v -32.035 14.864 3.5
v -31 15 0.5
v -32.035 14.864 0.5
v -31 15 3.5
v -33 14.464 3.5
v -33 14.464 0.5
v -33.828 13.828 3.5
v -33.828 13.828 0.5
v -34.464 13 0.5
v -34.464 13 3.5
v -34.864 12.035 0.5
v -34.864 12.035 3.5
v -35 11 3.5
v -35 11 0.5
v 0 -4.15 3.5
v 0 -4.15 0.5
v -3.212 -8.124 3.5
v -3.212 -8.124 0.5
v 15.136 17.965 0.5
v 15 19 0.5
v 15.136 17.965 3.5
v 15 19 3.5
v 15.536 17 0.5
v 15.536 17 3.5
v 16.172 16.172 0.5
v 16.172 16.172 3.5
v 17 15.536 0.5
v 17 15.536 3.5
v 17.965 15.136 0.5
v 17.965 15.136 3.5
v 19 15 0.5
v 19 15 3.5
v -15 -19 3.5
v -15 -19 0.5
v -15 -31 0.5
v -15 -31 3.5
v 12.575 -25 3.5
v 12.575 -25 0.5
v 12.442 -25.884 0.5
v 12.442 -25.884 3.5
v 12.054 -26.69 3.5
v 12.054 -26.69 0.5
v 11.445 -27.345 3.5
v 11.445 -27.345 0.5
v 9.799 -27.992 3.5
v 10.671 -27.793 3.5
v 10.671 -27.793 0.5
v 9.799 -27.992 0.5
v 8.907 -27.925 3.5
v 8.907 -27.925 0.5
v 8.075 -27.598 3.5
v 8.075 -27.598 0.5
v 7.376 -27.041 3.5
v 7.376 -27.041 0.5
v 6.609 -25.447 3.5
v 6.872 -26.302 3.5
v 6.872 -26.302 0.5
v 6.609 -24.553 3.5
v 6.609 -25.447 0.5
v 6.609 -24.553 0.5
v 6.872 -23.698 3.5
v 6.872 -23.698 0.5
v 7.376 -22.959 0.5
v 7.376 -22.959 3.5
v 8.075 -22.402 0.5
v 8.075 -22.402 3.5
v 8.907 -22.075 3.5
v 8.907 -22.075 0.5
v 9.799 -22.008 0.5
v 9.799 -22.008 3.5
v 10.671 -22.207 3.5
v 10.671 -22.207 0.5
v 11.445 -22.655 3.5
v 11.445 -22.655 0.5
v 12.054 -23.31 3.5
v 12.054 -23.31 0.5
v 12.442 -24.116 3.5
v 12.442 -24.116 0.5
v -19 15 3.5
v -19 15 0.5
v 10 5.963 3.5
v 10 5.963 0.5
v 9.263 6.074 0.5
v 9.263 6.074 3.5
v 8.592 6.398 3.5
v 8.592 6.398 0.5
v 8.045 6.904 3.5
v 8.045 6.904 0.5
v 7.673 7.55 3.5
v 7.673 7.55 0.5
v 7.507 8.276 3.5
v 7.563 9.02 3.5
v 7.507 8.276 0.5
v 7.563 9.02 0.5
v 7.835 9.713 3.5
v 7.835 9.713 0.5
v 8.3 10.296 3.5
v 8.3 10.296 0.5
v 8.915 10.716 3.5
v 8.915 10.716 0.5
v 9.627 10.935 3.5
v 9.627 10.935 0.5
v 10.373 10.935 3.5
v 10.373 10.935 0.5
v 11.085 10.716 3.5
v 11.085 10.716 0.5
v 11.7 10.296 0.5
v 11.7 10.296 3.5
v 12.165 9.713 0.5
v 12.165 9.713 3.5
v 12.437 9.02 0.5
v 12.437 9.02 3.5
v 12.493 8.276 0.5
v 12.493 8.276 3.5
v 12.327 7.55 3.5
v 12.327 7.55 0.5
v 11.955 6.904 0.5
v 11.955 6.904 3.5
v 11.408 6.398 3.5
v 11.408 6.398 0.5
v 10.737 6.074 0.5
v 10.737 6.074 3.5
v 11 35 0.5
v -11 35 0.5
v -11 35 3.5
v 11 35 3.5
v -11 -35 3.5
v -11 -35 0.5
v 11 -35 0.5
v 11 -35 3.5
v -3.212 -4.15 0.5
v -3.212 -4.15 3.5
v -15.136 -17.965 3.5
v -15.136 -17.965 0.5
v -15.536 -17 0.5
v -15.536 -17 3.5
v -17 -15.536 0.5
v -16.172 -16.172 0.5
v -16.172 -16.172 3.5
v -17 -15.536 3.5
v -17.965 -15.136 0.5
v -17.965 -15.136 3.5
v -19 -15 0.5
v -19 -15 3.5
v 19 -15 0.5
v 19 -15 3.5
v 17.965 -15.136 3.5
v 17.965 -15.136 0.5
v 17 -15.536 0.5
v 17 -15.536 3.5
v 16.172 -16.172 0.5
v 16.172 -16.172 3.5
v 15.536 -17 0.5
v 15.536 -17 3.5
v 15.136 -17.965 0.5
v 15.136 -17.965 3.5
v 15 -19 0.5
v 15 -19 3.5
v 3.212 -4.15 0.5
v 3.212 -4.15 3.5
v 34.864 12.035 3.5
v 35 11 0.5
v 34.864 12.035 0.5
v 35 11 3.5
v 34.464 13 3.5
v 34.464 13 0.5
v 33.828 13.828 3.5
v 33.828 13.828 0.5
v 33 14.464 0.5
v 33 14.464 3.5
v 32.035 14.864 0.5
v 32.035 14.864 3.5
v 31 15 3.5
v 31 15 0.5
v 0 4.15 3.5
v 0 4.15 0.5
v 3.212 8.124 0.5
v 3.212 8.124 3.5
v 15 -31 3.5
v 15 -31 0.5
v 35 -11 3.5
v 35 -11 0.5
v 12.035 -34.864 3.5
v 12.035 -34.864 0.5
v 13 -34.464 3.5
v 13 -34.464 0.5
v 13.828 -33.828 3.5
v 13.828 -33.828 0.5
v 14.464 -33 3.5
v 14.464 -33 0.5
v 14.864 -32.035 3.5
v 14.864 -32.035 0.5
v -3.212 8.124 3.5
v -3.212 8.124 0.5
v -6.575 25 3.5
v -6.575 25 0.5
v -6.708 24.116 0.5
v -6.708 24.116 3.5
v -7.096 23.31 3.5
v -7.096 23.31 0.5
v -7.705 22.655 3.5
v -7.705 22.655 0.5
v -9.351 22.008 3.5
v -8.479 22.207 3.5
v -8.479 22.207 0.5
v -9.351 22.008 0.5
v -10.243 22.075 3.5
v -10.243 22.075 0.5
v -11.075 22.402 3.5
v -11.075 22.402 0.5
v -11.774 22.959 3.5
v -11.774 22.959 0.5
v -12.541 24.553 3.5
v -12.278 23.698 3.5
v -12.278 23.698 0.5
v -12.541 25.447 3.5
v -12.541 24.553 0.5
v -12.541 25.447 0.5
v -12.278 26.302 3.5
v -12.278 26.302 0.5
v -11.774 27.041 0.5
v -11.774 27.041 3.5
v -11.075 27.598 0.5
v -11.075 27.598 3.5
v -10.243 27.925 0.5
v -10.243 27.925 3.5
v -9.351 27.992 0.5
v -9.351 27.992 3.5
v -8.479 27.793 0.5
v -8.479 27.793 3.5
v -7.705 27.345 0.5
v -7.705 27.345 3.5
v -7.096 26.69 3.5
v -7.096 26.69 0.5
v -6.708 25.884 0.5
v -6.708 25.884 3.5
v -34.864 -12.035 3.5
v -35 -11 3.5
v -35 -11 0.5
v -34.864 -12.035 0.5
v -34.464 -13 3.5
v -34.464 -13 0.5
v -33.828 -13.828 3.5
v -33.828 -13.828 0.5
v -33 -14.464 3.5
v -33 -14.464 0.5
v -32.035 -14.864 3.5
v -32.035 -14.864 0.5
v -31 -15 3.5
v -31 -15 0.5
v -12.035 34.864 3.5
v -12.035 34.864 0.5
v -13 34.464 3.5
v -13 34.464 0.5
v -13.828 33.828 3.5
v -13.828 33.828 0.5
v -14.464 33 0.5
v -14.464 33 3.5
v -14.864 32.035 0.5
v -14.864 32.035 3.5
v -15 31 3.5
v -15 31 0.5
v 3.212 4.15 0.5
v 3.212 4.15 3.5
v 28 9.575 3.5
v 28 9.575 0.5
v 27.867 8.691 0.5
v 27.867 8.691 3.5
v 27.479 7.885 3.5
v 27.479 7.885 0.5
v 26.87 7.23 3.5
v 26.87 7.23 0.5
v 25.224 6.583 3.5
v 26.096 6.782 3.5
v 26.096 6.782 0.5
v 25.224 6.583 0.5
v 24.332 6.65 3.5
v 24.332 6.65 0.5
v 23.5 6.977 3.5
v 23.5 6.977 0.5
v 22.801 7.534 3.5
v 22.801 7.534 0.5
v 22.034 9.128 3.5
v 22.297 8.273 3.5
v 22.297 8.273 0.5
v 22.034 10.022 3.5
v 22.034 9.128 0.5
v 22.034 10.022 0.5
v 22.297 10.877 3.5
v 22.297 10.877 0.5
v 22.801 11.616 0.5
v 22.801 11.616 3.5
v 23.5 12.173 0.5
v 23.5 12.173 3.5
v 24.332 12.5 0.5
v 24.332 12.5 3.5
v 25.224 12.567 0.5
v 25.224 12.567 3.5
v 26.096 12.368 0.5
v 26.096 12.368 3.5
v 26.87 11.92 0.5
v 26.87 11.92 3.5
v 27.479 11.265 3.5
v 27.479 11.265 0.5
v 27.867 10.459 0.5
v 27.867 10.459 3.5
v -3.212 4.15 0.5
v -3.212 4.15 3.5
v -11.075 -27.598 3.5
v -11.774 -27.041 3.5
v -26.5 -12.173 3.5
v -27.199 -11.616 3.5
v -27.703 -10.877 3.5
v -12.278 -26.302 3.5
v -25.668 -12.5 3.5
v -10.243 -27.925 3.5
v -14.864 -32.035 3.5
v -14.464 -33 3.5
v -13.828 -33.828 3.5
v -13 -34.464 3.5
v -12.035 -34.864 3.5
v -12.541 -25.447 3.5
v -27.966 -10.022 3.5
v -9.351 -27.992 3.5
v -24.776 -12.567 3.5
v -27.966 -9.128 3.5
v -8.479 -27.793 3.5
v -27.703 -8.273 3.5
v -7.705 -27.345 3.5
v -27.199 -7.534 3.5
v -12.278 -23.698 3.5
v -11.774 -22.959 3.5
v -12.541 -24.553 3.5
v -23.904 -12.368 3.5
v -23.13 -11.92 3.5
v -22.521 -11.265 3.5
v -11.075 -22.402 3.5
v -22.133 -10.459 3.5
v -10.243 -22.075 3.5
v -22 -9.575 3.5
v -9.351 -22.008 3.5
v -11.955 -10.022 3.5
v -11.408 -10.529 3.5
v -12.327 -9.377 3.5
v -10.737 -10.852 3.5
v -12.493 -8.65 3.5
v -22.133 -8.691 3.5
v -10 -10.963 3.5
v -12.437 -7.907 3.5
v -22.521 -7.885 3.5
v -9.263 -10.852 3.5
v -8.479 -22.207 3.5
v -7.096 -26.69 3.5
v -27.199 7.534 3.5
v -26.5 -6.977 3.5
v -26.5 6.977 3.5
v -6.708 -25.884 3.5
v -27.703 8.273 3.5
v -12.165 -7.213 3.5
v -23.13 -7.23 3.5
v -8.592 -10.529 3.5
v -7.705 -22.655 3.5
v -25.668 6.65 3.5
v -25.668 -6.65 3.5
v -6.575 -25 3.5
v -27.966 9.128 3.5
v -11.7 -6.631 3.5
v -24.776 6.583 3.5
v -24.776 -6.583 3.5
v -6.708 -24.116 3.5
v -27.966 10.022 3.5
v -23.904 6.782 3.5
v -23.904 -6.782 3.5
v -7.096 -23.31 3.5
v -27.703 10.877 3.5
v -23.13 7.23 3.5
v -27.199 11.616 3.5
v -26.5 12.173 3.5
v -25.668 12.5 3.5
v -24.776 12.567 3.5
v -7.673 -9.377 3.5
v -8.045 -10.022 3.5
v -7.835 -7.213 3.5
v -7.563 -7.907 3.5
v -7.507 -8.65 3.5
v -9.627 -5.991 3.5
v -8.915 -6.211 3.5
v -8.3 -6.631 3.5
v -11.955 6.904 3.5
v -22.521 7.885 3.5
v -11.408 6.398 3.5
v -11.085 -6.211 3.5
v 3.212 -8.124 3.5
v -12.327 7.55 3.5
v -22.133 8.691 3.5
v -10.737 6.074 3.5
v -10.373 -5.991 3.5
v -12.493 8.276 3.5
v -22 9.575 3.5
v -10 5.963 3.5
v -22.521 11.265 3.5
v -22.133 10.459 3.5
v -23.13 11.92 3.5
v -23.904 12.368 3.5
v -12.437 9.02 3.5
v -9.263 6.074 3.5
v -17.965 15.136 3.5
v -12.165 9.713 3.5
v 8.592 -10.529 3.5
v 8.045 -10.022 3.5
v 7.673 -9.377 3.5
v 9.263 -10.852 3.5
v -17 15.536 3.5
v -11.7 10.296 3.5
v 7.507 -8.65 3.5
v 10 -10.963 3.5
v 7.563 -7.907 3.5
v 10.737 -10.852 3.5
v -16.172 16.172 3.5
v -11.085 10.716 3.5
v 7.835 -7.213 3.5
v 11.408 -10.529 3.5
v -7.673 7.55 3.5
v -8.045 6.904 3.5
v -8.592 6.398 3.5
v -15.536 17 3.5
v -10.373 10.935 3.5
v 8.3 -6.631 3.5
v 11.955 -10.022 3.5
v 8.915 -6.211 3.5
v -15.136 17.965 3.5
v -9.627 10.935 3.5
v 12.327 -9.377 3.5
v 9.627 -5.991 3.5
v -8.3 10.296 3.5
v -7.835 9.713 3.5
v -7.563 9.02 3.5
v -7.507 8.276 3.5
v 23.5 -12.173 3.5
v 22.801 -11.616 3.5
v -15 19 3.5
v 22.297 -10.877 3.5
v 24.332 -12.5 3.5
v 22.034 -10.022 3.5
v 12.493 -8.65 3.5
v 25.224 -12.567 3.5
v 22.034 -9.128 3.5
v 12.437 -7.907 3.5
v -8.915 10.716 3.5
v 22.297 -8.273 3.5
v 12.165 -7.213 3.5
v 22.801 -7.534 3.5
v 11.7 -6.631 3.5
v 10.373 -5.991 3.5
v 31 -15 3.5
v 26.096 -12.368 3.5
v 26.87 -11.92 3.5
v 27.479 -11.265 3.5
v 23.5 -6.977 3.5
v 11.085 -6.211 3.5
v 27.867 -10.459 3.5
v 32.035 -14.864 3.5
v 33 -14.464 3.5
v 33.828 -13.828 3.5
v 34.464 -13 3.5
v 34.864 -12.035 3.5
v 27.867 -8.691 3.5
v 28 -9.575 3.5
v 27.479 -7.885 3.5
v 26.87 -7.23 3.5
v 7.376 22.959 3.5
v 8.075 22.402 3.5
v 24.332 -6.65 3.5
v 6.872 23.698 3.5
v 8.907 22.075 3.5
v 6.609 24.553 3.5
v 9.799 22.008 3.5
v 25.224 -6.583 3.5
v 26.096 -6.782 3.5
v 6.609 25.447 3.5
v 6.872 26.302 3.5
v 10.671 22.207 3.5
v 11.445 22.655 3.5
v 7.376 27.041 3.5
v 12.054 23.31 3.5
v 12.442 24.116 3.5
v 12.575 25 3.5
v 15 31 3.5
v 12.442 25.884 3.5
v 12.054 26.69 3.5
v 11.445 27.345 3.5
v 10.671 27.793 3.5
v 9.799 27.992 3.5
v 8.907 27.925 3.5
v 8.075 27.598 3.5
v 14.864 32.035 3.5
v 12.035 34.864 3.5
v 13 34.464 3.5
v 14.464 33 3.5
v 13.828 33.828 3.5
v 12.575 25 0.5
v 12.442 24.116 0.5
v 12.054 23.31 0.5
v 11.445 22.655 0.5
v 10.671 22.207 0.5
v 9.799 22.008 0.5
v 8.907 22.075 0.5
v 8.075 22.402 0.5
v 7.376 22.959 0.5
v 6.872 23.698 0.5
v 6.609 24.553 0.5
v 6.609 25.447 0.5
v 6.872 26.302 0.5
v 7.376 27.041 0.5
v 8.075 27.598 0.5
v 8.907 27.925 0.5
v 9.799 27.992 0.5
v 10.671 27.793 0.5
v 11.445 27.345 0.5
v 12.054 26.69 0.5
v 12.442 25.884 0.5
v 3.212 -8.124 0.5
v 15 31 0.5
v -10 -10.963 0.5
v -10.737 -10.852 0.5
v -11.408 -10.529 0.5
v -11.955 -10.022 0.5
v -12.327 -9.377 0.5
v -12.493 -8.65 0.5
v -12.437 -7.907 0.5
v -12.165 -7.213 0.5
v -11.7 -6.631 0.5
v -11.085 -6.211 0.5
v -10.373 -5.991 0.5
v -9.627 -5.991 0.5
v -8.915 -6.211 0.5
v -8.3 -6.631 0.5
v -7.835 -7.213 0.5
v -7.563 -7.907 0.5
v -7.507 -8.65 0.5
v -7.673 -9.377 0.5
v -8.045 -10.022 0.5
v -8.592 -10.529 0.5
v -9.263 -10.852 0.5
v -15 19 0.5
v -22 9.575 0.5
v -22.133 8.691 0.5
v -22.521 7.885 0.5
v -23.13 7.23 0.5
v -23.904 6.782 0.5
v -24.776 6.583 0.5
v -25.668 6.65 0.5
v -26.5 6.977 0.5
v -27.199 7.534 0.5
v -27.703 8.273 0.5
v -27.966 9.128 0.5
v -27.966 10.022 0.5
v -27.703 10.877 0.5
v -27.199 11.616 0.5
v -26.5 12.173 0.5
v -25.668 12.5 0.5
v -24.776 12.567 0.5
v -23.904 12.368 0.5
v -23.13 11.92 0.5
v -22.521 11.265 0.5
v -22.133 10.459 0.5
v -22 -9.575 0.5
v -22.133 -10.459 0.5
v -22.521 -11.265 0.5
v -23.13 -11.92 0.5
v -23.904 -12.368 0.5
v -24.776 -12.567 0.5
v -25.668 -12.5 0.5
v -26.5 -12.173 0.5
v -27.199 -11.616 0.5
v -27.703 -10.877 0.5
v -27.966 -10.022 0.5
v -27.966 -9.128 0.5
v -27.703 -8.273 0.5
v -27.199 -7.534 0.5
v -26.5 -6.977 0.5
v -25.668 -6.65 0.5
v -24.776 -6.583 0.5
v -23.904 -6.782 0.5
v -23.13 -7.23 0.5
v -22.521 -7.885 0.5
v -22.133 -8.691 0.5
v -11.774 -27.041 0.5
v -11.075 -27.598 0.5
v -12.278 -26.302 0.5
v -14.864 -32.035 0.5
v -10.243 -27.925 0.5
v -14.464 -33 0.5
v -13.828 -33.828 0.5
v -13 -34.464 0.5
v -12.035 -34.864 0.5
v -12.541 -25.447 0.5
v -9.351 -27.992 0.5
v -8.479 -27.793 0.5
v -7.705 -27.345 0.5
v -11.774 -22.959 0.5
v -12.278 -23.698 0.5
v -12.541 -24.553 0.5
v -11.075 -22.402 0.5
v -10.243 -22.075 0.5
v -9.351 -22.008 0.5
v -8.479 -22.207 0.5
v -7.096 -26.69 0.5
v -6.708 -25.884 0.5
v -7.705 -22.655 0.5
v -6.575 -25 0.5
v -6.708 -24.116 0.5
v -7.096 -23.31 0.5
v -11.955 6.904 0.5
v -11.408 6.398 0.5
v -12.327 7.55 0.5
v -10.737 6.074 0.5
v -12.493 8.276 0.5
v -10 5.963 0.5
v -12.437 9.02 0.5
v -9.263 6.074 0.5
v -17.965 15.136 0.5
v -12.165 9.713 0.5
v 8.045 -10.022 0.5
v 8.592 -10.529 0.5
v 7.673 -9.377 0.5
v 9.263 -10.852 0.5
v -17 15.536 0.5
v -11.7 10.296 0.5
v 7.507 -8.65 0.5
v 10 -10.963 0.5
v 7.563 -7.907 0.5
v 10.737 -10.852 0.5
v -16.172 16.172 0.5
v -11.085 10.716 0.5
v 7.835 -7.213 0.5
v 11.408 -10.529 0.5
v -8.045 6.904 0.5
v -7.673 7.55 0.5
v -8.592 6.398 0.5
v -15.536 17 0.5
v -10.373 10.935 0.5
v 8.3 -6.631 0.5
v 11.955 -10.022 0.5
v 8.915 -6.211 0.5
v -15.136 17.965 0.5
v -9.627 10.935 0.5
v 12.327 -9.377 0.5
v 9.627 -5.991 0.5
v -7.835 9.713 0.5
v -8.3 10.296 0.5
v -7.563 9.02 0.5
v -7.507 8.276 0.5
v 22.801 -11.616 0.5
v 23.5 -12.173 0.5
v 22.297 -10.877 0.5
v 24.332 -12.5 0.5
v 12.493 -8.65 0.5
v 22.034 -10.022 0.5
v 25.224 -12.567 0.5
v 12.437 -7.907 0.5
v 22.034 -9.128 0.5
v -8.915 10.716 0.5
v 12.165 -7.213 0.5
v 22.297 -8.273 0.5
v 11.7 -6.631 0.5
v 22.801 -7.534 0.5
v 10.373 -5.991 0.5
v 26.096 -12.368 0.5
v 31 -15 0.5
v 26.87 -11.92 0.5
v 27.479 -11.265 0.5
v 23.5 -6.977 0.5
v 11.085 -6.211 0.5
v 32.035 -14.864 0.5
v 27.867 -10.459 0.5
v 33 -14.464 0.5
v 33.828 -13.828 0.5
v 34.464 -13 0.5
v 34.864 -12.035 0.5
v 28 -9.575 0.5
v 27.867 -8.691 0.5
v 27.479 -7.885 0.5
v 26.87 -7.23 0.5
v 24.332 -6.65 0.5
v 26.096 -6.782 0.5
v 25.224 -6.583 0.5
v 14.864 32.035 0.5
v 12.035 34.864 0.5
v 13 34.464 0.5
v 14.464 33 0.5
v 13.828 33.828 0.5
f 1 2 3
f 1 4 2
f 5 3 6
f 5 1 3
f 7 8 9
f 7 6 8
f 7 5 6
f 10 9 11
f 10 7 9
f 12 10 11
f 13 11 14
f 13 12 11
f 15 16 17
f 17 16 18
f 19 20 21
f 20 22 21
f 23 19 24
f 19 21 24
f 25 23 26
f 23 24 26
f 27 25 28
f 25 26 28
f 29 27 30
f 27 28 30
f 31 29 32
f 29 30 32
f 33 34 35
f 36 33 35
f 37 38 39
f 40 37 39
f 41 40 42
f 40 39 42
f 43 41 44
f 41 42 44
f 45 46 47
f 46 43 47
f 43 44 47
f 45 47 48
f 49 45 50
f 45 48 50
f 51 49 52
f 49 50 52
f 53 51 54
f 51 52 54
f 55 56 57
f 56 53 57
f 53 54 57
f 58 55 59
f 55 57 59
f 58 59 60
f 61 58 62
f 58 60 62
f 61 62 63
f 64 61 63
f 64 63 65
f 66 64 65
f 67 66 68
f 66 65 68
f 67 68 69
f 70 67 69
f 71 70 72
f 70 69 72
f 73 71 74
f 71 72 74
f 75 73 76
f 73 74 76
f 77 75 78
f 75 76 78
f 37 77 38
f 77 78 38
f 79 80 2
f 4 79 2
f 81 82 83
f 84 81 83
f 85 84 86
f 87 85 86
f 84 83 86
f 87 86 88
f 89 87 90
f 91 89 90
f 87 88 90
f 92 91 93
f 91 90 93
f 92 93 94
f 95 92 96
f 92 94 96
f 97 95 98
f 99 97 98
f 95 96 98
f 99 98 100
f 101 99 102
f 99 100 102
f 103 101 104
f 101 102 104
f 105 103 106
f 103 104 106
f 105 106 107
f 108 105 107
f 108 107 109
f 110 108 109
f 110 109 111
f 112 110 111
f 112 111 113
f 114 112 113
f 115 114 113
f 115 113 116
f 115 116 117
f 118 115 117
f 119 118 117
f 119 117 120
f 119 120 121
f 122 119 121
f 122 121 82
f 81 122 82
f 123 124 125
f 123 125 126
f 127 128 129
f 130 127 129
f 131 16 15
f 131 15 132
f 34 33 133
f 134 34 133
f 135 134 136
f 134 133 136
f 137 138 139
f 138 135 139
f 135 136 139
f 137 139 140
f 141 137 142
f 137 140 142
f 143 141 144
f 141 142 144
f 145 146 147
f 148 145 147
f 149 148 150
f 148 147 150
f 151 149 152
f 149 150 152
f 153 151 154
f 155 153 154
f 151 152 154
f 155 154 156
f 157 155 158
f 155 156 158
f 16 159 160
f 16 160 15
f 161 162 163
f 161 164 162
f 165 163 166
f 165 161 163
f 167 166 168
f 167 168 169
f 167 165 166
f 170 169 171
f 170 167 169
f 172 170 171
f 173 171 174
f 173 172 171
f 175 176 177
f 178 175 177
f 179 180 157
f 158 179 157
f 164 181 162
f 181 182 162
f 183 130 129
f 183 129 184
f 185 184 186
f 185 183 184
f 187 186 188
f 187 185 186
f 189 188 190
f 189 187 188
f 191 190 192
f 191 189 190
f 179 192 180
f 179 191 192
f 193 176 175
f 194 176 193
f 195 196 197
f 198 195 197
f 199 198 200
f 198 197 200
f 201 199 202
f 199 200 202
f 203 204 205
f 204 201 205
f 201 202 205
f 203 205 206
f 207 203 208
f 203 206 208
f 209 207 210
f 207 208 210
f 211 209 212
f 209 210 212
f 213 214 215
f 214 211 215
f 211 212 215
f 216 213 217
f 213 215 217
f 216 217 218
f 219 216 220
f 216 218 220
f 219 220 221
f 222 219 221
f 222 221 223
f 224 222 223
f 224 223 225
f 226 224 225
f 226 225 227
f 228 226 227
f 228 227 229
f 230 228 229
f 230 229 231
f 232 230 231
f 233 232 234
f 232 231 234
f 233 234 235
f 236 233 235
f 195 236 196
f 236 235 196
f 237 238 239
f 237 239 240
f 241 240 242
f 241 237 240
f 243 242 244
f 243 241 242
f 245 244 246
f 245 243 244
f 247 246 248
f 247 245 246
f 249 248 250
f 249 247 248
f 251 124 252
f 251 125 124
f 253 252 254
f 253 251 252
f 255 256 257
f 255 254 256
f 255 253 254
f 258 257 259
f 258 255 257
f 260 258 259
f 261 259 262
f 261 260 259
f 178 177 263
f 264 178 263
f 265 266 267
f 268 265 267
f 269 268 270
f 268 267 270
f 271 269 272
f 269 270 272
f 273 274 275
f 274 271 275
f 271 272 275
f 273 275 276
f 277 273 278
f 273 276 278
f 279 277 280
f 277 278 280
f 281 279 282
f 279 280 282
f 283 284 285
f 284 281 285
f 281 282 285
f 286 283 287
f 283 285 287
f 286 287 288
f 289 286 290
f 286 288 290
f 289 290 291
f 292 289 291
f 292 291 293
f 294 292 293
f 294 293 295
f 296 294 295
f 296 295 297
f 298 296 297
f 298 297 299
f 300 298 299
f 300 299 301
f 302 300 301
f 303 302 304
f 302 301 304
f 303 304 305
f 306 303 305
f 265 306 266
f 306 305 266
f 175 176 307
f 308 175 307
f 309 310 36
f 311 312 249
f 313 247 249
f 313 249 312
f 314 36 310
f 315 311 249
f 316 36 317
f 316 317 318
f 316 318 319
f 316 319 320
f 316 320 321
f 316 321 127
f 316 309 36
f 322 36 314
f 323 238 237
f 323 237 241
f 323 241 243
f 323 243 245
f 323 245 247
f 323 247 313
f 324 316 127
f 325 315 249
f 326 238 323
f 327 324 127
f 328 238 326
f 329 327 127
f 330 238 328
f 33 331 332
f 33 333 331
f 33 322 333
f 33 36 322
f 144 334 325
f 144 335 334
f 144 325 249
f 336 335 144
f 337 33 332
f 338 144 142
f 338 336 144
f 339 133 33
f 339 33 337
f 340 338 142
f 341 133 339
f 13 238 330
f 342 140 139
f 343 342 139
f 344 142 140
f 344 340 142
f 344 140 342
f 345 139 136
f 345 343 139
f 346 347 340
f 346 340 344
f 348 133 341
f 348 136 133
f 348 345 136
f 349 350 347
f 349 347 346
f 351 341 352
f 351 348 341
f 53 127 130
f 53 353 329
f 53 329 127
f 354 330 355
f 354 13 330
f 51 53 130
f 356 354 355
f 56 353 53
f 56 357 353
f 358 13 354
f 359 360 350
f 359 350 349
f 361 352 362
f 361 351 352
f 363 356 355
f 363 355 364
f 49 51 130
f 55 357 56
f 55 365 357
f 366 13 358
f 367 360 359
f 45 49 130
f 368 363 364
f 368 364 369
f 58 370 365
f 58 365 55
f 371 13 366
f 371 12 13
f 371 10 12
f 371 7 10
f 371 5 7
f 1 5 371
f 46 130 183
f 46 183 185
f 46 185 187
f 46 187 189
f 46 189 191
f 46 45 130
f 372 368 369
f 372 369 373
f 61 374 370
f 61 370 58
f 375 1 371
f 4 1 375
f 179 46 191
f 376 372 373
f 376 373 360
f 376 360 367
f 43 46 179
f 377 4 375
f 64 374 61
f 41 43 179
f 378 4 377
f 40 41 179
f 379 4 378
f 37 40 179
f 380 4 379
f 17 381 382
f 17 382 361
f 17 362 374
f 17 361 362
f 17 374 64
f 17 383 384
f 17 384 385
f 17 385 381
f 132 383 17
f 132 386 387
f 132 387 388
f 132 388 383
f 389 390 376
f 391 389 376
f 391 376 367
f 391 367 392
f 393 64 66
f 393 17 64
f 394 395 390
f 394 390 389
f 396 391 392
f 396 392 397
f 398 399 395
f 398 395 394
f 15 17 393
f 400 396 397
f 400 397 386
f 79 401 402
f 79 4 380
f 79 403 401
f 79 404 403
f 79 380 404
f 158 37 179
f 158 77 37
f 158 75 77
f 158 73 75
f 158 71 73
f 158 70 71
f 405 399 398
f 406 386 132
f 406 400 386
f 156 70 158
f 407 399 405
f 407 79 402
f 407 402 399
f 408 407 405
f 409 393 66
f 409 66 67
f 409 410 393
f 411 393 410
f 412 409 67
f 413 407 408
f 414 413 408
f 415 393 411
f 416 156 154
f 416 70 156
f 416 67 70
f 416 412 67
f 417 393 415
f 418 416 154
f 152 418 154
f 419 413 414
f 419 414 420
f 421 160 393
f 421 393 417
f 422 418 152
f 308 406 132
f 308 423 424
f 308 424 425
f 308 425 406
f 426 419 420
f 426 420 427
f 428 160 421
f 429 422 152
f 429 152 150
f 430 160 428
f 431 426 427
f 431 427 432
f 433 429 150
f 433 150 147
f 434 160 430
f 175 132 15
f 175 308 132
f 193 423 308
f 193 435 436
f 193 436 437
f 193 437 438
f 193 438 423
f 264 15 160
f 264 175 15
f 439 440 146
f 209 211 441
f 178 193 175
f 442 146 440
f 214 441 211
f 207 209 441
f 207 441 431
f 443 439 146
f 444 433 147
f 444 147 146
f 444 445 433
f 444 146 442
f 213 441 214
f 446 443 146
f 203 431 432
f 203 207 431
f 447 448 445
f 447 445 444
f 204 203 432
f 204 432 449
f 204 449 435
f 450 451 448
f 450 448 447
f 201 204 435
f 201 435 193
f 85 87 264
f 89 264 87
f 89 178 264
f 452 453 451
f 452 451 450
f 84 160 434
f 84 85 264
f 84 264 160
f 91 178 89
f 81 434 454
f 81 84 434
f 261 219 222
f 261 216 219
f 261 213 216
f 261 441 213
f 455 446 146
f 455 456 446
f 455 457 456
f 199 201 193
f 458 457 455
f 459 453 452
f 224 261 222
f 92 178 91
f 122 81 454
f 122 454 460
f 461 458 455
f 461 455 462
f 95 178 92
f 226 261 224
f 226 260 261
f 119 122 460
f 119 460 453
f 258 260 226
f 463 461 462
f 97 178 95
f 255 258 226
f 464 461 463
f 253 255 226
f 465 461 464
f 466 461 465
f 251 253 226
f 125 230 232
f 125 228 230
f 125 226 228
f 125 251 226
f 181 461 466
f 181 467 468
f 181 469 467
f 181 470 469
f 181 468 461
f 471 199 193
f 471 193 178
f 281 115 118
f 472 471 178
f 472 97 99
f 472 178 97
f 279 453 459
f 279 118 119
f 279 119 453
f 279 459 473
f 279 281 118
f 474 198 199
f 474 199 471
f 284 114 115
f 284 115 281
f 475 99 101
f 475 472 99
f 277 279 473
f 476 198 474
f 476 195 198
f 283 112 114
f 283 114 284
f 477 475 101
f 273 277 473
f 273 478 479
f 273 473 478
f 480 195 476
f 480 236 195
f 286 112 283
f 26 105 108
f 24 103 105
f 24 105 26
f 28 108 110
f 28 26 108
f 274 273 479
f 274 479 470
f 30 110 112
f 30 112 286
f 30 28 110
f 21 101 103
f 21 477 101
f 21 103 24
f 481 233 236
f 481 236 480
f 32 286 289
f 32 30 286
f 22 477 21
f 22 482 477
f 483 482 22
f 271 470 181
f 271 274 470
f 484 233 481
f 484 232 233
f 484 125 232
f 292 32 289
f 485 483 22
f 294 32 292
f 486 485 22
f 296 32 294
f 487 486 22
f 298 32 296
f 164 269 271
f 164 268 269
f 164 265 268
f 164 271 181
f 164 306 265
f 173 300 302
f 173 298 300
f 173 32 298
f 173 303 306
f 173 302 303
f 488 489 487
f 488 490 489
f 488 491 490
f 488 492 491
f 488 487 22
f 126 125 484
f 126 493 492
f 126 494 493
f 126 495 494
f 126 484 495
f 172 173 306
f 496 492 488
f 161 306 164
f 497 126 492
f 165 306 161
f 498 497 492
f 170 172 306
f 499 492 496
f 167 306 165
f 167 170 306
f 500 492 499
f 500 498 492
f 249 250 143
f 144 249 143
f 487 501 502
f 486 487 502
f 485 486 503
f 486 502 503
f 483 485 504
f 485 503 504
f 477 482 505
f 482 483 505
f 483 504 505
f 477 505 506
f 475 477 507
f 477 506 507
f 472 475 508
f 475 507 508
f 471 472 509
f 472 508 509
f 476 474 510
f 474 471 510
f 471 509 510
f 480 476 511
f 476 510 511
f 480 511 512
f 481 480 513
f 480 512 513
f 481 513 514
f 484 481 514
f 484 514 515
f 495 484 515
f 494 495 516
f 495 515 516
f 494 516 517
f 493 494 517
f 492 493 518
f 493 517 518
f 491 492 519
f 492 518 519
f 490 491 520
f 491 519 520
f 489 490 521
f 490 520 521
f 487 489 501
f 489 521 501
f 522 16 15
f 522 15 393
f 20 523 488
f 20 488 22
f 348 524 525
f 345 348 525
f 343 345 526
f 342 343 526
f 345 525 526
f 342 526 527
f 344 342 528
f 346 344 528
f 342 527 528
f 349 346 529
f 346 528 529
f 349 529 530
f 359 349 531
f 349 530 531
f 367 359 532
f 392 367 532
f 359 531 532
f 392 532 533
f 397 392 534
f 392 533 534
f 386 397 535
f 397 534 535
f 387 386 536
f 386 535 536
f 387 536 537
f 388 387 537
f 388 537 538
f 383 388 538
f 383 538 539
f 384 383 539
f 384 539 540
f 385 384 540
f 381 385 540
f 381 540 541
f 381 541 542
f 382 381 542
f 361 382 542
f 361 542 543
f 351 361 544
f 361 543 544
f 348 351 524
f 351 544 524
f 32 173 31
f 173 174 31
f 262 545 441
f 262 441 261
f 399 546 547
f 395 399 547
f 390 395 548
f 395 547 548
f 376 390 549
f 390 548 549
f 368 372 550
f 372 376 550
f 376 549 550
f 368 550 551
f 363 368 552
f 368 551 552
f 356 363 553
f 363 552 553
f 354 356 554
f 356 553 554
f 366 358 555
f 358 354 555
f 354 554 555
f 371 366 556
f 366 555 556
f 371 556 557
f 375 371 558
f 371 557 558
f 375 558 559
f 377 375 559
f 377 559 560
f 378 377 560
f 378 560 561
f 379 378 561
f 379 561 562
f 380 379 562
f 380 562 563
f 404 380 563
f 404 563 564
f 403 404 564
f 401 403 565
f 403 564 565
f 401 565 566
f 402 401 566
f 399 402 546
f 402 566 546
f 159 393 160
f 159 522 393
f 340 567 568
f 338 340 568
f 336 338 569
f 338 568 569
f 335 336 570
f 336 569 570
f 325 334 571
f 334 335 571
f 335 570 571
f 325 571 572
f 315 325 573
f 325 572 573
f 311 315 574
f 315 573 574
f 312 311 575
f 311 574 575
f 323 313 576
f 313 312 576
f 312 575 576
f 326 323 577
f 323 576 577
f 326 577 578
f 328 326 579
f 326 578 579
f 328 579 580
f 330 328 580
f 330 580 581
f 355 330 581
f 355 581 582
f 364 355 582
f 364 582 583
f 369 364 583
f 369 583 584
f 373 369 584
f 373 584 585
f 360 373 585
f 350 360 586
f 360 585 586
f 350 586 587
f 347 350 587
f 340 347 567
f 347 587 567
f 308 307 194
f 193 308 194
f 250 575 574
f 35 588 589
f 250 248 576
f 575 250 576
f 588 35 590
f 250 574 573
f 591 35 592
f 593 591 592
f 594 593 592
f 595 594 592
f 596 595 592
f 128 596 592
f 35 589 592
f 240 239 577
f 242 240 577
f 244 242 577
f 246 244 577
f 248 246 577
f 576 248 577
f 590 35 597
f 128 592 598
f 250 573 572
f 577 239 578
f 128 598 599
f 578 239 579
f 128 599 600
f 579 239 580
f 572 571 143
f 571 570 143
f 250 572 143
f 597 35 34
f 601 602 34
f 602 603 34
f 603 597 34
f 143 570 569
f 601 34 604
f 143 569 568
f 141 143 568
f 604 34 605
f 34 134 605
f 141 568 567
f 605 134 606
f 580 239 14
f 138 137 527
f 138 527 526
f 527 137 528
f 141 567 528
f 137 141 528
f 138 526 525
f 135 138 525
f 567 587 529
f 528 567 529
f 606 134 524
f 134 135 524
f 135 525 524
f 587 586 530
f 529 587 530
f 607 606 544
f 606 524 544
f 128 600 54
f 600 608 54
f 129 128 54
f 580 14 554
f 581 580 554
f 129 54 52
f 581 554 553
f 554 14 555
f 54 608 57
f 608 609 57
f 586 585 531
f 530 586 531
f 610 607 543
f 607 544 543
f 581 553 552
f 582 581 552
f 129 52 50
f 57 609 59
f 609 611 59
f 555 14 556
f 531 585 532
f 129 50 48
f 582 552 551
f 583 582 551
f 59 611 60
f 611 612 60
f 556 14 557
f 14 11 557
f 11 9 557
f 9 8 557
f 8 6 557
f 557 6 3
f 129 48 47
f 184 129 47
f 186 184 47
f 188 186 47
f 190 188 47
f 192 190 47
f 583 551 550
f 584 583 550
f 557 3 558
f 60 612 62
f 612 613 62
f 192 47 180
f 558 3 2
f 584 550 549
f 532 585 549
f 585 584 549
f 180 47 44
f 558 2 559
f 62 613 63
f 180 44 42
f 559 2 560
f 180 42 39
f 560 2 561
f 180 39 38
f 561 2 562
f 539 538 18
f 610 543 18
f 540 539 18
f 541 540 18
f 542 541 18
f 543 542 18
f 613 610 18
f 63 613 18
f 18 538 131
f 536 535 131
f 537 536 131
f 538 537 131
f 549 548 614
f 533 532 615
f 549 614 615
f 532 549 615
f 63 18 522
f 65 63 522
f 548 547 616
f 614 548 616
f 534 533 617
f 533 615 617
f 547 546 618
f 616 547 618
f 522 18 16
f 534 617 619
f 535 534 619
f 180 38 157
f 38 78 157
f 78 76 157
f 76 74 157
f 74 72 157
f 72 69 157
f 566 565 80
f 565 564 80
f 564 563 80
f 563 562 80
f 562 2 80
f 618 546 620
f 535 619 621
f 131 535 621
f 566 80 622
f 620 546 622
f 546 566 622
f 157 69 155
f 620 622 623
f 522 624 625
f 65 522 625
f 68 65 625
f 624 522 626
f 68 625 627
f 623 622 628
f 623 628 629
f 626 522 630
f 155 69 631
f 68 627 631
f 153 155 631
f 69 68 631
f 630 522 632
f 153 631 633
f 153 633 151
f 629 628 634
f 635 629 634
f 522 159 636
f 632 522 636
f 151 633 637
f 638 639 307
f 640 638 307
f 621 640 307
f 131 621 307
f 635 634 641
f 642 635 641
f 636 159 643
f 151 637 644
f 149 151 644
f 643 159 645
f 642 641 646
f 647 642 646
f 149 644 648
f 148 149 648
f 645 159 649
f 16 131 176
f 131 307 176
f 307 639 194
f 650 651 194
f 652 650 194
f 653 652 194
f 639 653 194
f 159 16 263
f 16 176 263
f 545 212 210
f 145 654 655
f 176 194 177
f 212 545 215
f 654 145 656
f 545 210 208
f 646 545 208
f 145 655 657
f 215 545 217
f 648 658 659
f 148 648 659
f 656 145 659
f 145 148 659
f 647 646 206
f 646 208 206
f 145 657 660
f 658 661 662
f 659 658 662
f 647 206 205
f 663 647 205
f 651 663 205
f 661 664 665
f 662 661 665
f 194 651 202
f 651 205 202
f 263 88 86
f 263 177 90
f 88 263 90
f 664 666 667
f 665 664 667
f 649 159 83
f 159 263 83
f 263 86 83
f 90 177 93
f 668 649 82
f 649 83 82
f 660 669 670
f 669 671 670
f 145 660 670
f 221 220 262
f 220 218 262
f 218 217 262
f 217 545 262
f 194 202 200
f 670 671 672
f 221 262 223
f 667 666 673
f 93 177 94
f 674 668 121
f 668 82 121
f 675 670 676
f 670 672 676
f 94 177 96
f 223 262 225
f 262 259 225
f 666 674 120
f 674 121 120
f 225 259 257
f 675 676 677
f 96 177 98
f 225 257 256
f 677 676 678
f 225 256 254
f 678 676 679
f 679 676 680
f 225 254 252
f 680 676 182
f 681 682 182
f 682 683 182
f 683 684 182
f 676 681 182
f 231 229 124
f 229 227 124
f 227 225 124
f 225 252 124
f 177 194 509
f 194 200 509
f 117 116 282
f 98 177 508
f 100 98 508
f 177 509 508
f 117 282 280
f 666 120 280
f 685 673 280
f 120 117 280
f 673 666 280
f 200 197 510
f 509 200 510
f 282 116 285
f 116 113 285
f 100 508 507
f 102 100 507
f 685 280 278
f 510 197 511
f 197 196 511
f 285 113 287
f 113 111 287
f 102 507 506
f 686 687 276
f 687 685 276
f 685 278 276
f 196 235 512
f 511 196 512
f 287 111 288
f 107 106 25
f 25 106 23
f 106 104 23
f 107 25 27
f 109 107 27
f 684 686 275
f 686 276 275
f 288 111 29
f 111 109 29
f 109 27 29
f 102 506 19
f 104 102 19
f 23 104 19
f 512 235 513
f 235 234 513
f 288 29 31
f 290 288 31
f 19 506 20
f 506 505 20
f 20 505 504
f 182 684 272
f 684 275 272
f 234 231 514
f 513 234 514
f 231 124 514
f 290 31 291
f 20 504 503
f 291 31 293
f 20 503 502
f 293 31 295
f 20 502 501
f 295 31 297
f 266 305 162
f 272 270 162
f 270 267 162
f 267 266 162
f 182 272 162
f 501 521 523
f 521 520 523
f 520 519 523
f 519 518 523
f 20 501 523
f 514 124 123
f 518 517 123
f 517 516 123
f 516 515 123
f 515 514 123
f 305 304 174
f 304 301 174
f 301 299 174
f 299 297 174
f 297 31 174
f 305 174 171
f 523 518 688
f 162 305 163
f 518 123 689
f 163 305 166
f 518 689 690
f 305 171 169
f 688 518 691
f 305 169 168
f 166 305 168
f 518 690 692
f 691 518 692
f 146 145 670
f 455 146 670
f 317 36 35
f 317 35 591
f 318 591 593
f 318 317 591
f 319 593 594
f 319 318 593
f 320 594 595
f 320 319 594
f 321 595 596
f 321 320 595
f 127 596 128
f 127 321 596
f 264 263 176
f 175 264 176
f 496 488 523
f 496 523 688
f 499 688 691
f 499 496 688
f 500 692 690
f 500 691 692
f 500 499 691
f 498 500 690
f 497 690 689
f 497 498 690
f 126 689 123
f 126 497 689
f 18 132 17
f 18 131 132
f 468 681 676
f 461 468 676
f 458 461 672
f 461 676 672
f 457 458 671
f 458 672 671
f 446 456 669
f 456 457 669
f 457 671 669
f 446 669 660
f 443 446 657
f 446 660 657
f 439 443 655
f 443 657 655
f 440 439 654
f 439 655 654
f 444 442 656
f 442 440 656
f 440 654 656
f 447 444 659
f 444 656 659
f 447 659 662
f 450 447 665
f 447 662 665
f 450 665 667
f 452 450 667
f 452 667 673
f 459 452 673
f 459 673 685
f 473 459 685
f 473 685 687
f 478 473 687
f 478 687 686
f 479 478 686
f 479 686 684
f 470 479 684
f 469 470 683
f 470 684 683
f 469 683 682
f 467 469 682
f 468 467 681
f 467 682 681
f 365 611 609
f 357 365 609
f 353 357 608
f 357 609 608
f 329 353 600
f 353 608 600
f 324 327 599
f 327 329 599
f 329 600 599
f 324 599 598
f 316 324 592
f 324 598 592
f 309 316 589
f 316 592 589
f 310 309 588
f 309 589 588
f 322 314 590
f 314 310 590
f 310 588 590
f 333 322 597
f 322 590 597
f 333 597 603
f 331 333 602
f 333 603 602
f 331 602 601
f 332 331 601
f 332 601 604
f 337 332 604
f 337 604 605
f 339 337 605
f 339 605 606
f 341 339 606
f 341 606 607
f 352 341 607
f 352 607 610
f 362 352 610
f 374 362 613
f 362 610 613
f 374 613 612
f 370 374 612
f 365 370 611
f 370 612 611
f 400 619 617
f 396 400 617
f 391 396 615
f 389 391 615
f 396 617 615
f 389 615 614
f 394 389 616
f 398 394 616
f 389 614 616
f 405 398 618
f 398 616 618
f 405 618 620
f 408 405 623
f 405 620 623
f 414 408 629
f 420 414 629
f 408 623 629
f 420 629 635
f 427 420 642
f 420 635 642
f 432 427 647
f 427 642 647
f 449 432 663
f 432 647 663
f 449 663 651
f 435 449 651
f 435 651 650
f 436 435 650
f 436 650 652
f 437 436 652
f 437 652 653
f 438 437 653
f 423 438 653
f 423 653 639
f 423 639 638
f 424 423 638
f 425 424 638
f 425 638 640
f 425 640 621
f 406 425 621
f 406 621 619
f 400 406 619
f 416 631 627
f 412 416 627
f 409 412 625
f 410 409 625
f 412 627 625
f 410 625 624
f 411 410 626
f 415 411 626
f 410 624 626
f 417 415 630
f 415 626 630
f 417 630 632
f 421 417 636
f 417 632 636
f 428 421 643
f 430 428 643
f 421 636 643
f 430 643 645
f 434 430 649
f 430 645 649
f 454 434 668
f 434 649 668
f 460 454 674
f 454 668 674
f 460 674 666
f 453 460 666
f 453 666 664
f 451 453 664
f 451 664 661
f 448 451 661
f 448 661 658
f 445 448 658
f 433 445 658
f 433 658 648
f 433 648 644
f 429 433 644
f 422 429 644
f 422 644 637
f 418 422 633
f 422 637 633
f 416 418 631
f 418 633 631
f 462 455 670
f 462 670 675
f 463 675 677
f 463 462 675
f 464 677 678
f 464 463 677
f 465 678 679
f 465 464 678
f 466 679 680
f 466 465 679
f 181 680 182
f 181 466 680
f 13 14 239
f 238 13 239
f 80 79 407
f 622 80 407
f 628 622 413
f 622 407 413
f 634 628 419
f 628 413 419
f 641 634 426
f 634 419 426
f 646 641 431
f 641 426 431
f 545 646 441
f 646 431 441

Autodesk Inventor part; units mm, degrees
sketch "Sketch1" plane through (0, 0, 0) normal (0, 0, 1) x (1, 0, 0)
  line L0 (-336.1151, 0) -> (336.1151, 0) construction
  line L1 (15, 0) -> (50, 0) construction
  arc A0 (118.85, 219.94) -> (113.6034, 240) centre (-43.6266, 188.1614) ccw
  spline S0 degree 3 poles (118.85, 219.94) (128.5526, 163.9297) (111.383, 35.0272) (50, 0) knots 0 0 0 0 1 1 1 1
  line L2 (15, -15) -> (-15, -15)
  line L3 (-15, -15) -> (-15, 15)
  line L4 (-15, 15) -> (15, 15)
  line L5 (15, 15) -> (15, -15)
  line L6 (15, -15) -> (-15, 15) construction
  line L7 (-15, -15) -> (15, 15) construction
  line L8 (-32.5, -4.15) -> (32.5, -4.15) construction
  line L9 (32.5, -4.15) -> (32.5, 4.15) construction
  line L10 (32.5, 4.15) -> (-32.5, 4.15) construction
  line L11 (-32.5, 4.15) -> (-32.5, -4.15) construction
  line L12 (-32.5, -4.15) -> (32.5, 4.15) construction
  line L13 (32.5, -4.15) -> (-32.5, 4.15) construction
  arc A1 (15, 0) -> (50, 0) centre (32.5, 54.6766) ccw
  arc A2 (0, 15) -> (0, 50) centre (-54.6766, 32.5) ccw
  spline S1 degree 3 poles (-219.94, 118.85) (-163.9297, 128.5526) (-35.0272, 111.383) (0, 50) knots 0 0 0 0 1 1 1 1
  arc A3 (-219.94, 118.85) -> (-240, 113.6034) centre (-188.1614, -43.6266) ccw
  arc A4 (-15, 0) -> (-50, 0) centre (-32.5, -54.6766) ccw
  spline S2 degree 3 poles (-118.85, -219.94) (-128.5526, -163.9297) (-111.383, -35.0272) (-50, 0) knots 0 0 0 0 1 1 1 1
  arc A5 (-118.85, -219.94) -> (-113.6034, -240) centre (43.6266, -188.1614) ccw
  arc A6 (0, -15) -> (0, -50) centre (54.6766, -32.5) ccw
  spline S3 degree 3 poles (219.94, -118.85) (163.9297, -128.5526) (35.0272, -111.383) (0, -50) knots 0 0 0 0 1 1 1 1
  arc A7 (219.94, -118.85) -> (240, -113.6034) centre (188.1614, 43.6266) ccw
  point P0 (0, 0)
  point P1 (96.03, 57.2611)
  point P2 (119.66, 152.26)
  point P3 (119.6553, 152.2584)
  point P4 (0, 0)
  point P5 (-152.2584, 119.6553)
  point P6 (-57.2611, 96.03)
  point P7 (-15, 0)
  point P8 (-119.6553, -152.2584)
  point P9 (-96.03, -57.2611)
  point P10 (0, -15)
  point P11 (240, -113.6034)
  point P12 (152.2584, -119.6553)
  point P13 (57.2611, -96.03)
  point P14 (-15, 0)
  point P15 (-152.2584, 119.6553)
  point P16 (-57.2611, 96.03)
  point P17 (-119.6553, -152.2584)
  point P18 (-96.03, -57.2611)
  point P19 (152.2584, -119.6553)
  point P20 (57.2611, -96.03)
  dimension "d0" = 50
  dimension "d1" = 57.2611
  dimension "d2" = 96.03
  dimension "d3" = 119.66
  dimension "d6" = 118.85
  dimension "d12" = 240
  dimension "d38" = 65
  dimension "d39" = 8.3
  dimension "d61" = 360
sketch "Sketch2" plane through (0, 0, 0) normal (1, 0, 0) x (0, 1, 0)
  point P0 (0, 0)
  point P1 (0, 0)
  point P2 (240, 0)
ref_plane "Work Plane1" through (15, 0, 0) normal (1, 0, 0) x (0, 1, 0)
sketch "Sketch3" plane through (15, 0, 0) normal (1, 0, 0) x (0, 1, 0)
  line L0 (-10, -0.5) -> (10, -0.5)
  line L1 (10, -0.5) -> (10, 0.5)
  line L2 (10, 0.5) -> (-10, 0.5)
  line L3 (-10, 0.5) -> (-10, -0.5)
  line L4 (-10, -0.5) -> (10, 0.5) construction
  line L5 (10, -0.5) -> (-10, 0.5) construction
  point P0 (0, 0)
  dimension "d8" = 20
  dimension "d9" = 1
ref_plane "Work Plane2" through (52.6524, -10, -0.5) normal (0, 0, -1) x (-1, 0, 0)
sketch "Sketch4" plane through (52.6524, -10, -0.5) normal (0, 0, -1) x (-1, 0, 0)
  point P0 (52.6524, 10)
  point P1 (2.6524, 10)
  point P2 (-43.3776, 67.2611)
  point P3 (-67.0076, 162.26)
  point P4 (-66.1976, 229.94)
ref_plane "Work Plane3" through (15, -10, 0.5) normal (0, 0, 1) x (1, 0, 0)
sketch "Sketch5" plane through (15, -10, 0.5) normal (0, 0, 1) x (1, 0, 0)
  line L0 (17.5, 14.15) -> (-47.5, 14.15) construction
  line L1 (-47.5, 5.85) -> (17.5, 5.85) construction
  line L2 (-47.5, 14.15) -> (-47.5, 5.85) construction
  line L3 (17.5, 5.85) -> (17.5, 14.15) construction
  line L4 (0, -5) -> (20, -5)
  line L5 (20, -5) -> (20, 25)
  line L6 (20, 25) -> (0, 25)
  line L7 (0, 25) -> (0, -5)
  line L8 (0, 14.15) -> (20, 25) construction
  line L9 (20, 14.15) -> (0, 25) construction
  line L10 (0, -5) -> (20, 5.85) construction
  line L11 (20, -5) -> (0, 5.85) construction
  line L12 (10, 19.575) -> (10, 0.425) construction
  point P0 (-15, 10)
  point P1 (0, 25)
  point P2 (-30, 25)
  point P3 (-30, -5)
  dimension "d40" = 20
  dimension "d41" = 30
ref_plane "Work Plane5" through (15, 15, 0.5) normal (0, 0, 1) x (1, 0, 0)
sketch "Sketch6" plane through (15, 15, 0.5) normal (0, 0, 1) x (1, 0, 0)
  circle A0 centre (81.03, 42.2611) radius 6.8 projected
  circle A1 centre (103.85, 204.94) radius 6.8 projected
  circle A2 centre (104.66, 137.26) radius 6.8 projected
  circle A3 centre (35, -15) radius 6.8 projected
  arc A4 (113.2428, 206.6719) -> (106.6941, 230.8772) centre (-58.6266, 173.1614) ccw projected
  line L0 (90.5128, 219.1228) -> (106.6941, 230.8772) projected
  arc A5 (94.5125, 203.2183) -> (90.5128, 219.1228) centre (-58.6266, 173.1614) ccw projected
  arc A6 (20, -8.1753) -> (29.677, -6.6675) centre (17.5, 39.6766) ccw projected
  line L1 (20, -8.1753) -> (20, 0) projected
  line L2 (20, 0) -> (0, 0) projected
  line L3 (0, 0) -> (0, -15) projected
  line L4 (-1.9583, -24.4011) -> (0, -15) projected
  arc A7 (-1.9583, -24.4011) -> (0, -24.9633) centre (17.5, 39.6766) ccw projected
  line L5 (0, -24.9633) -> (0, -30) projected
  line L6 (0, -30) -> (20, -30) projected
  line L7 (20, -30) -> (20, -27.2437) projected
  arc A8 (20, -27.2437) -> (37.8217, -24.1325) centre (17.5, 39.6766) ccw projected
  circle A9 centre (10, -24.575) radius 3 projected
  circle A10 centre (10, -5.425) radius 3 projected
  line L8 (0, -15) -> (0, 0) projected
  line L9 (0, 0) -> (-1.9583, 0)
  line L10 (-1.9583, 0) -> (-1.9583, -30)
  line L11 (-1.9583, -30) -> (0, -30)
  line L12 (0, -30) -> (0, 0)
  point P0 (-15, -15)
ref_plane "Work Plane4" through (15, 15, 0.5) normal (0, 0, 1) x (1, 0, 0)
sketch "Sketch7" plane through (15, 15, 0.5) normal (0, 0, 1) x (1, 0, 0)
  line L0 (-50, -30) -> (20, -30)
  line L1 (20, -30) -> (20, 0)
  line L2 (20, 0) -> (-50, 0)
  line L3 (-50, 0) -> (-50, -30)
  line L4 (-16, -30) -> (-14, -30)
  line L5 (-14, 0) -> (-16, 0)
  line L6 (20, -20) -> (20, -10)
  line L7 (-50, -10) -> (-50, -20)
  line L8 (20, 0) -> (20, -30)
  line L9 (20, -30) -> (0, -30)
  line L10 (-50, 0) -> (-30, 0)
  line L11 (-30, -30) -> (-50, -30)
  line L12 (-50, -30) -> (-50, 0)
  line L13 (20, -10) -> (20, 0)
  line L14 (20, 0) -> (0, 0)
  line L15 (0, -30) -> (20, -30) projected
  line L16 (20, -20) -> (20, -30)
  line L17 (20, -30) -> (0, -30)
  line L18 (-30, -30) -> (-16, -30)
  circle A0 centre (10, -5.425) radius 3 projected
  circle A1 centre (10, -24.575) radius 3 projected
  line L19 (-50, -15) -> (20, -15) construction
  circle A2 centre (-40, -5.425) radius 3
  circle A3 centre (-40, -24.575) radius 3
  line L20 (-48.7, -19.15) -> (18.7, -19.15) construction
  line L21 (-48.7, -10.85) -> (-48.7, -15) construction
  line L22 (-48.7, -19.15) -> (18.7, -10.85) construction
  line L23 (18.7, -19.15) -> (-48.7, -10.85) construction
  line L24 (-15, -10.85) -> (-18.212, -6.8756)
  line L25 (-15, -10.85) -> (-11.788, -6.8756)
  line L26 (-50, -19.15) -> (-50, -10.85)
  line L27 (20, -19.15) -> (18.7, -19.15)
  line L28 (20, -10.85) -> (20, -19.15)
  line L29 (18.7, -10.85) -> (-11.788, -10.85) construction
  line L30 (-18.212, -10.85) -> (-48.7, -10.85) construction
  line L31 (-18.212, -6.8756) -> (-11.788, -6.8756)
  line L32 (-48.7, -15) -> (-49.61, -12.5368)
  line L33 (-48.7, -15) -> (-49.61, -17.4632)
  line L34 (-49.61, -17.4632) -> (-49.61, -12.5368)
  line L35 (-18.212, -6.8756) -> (-11.788, -6.8756)
  line L36 (-11.788, -6.8756) -> (-11.788, -10.85)
  line L37 (-11.788, -10.85) -> (-18.212, -10.85)
  line L38 (-18.212, -10.85) -> (-18.212, -6.8756)
  line L39 (-15, -19.15) -> (-18.212, -23.1244)
  line L40 (-15, -19.15) -> (-11.788, -23.1244)
  line L41 (-18.212, -23.1244) -> (-11.788, -23.1244)
  line L42 (-18.212, -23.1244) -> (-11.788, -23.1244)
  line L43 (-11.788, -23.1244) -> (-11.788, -19.15)
  line L44 (-11.788, -19.15) -> (-18.212, -19.15)
  line L45 (-18.212, -19.15) -> (-18.212, -23.1244)
  line L46 (-15, 0) -> (-15, -30) construction
  line L47 (-49.61, -12.5368) -> (-48.7, -12.5368)
  line L48 (-48.7, -12.5368) -> (-48.7, -17.4632)
  line L49 (-48.7, -17.4632) -> (-49.61, -17.4632)
  line L50 (-49.61, -17.4632) -> (-49.61, -12.5368)
  line L51 (18.7, -15) -> (19.61, -12.5368)
  line L52 (18.7, -15) -> (19.61, -17.4632)
  line L53 (19.61, -17.4632) -> (19.61, -12.5368)
  line L54 (19.61, -12.5368) -> (18.7, -12.5368)
  line L55 (18.7, -12.5368) -> (18.7, -17.4632)
  line L56 (18.7, -17.4632) -> (19.61, -17.4632)
  line L57 (19.61, -17.4632) -> (19.61, -12.5368)
  circle A4 centre (-24.575, -40) radius 3
  circle A5 centre (-5.425, -40) radius 3
  circle A6 centre (10, -24.575) radius 3
  circle A7 centre (10, -5.425) radius 3
  circle A8 centre (-5.425, 10) radius 3
  circle A9 centre (-24.575, 10) radius 3
  line L58 (-30, 20) -> (0, 20)
  line L59 (0, 20) -> (0, 0)
  line L60 (0, 0) -> (-30, 0)
  line L61 (-30, 0) -> (-30, 20)
  line L62 (-30, 20) -> (0, 0) construction
  line L63 (0, 20) -> (-30, 0) construction
  line L64 (-30, -50) -> (0, -50)
  line L65 (0, -50) -> (0, -30)
  line L66 (-30, -30) -> (-30, -50)
  line L67 (-30, -50) -> (0, -50)
  line L68 (0, -50) -> (0, -30)
  line L69 (0, -30) -> (-30, -30)
  line L70 (-30, -30) -> (-30, -50)
  point P0 (-15, -15)
  point P1 (-15, 10)
  dimension "d63" = 2
  dimension "d72" = 6
  dimension "d73" = 6
  dimension "d77" = 67.4
  dimension "d78" = 8.3
  dimension "d84" = 70
  dimension "d91" = 360
  dimension "d93" = 30
extrude "Extrusion7" add sketch "Sketch7" along normal blind 3 contours L3 L2 L1 L0 | L24 L31 L25 | L33 L34 L32 | L40 L41 L39 | L51 L53 L52
extrude "Extrusion8" add sketch "Sketch7" along normal blind 3 contours L61 L58 L59 L2
extrude "Extrusion9" add sketch "Sketch7" along normal blind 3 contours L0 L65 L64 L66
fillet "Fillet7" radius 4 12 edges at (15, 15, 2) (15, 35, 2) (35, 15, 2) (35, -15, 2) (15, -35, 2) (-15, -35, 2) (-15, -15, 2) (-35, -15, 2) (-35, 15, 2) (-15, 35, 2) (-15, 15, 2) (15, -15, 2)
sketch "Sketch8" plane through (15, 15, 3.5) normal (0, 0, 1) x (1, 0, 0)
  line L0 (-49.61, -12.5368) -> (-48.7, -12.5368) construction
  line L1 (19.61, -17.4632) -> (18.7, -17.4632) construction
  line L2 (-48.7, -12.5368) -> (18.7, -17.4632) construction
  line L3 (-48.7, -17.4632) -> (18.7, -12.5368) construction
  line L4 (-48.7, -12.5368) -> (18.7, -12.5368) construction
  line L5 (18.7, -12.5368) -> (18.7, -17.4632) construction
  line L6 (18.7, -17.4632) -> (-48.7, -17.4632) construction
  line L7 (-48.7, -17.4632) -> (-48.7, -12.5368) construction
  line L8 (-48.7, -12.5368) -> (-15, -12.5368) construction
  line L9 (-15, -12.5368) -> (-15, -17.4632) construction
  line L10 (-15, -17.4632) -> (-48.7, -17.4632) construction
  line L11 (-48.7, -17.4632) -> (-48.7, -12.5368) construction
  line L12 (-31.85, -17.4632) -> (-31.85, 4.3897) construction
  line L13 (-48.7, -15) -> (-15, -15) construction
  line L14 (-31.85, -6.5368) -> (-1.9543, -6.5368) construction
  line L15 (-48.7, -17.4632) -> (18.7, -17.4632)
  line L16 (18.7, -17.4632) -> (18.7, -12.5368)
  line L17 (18.7, -12.5368) -> (-48.7, -12.5368)
  line L18 (-48.7, -12.5368) -> (-48.7, -17.4632)
  point P0 (-25, -6.5368)
  point P1 (-25, -23.4632)
  point P2 (-5, -6.5368)
  point P3 (-5, -23.4632)
  dimension "d99" = 6
  dimension "d107" = 10
hole "Hole4" at (-10, 8.4632, 3.5) at (-10, -8.4632, 3.5) at (10, -8.4632, 3.5) at (10, 8.4632, 3.5) direction (0, 0, -1) diameter 5 end through all
sketch "Sketch9" plane through (15, 15, 3.5) normal (0, 0, 1) x (1, 0, 0)
  line L0 (-49.61, -12.5368) -> (-48.7, -12.5368) projected
  line L1 (-48.7, -15) -> (-49.61, -12.5368) projected
  line L2 (-49.61, -17.4632) -> (-48.7, -15) projected
  line L3 (-48.7, -15) -> (-48.7, -17.4632) projected
  line L4 (-48.7, -17.4632) -> (-49.61, -17.4632) projected
  line L5 (-48.7, -12.5368) -> (-48.7, -15) projected
  line L6 (18.7, -12.5368) -> (19.61, -12.5368) projected
  line L7 (19.61, -12.5368) -> (18.7, -15) projected
  line L8 (18.7, -15) -> (18.7, -12.5368) projected
  line L9 (18.7, -17.4632) -> (18.7, -15) projected
  line L10 (18.7, -15) -> (19.61, -17.4632) projected
  line L11 (19.61, -17.4632) -> (18.7, -17.4632) projected
  point P0 (-15, -15)
extrude "Extrusion10" add sketch "Sketch9" against normal blind 3
properties part number "underbrink_base_lite" material "Stainless Steel"
